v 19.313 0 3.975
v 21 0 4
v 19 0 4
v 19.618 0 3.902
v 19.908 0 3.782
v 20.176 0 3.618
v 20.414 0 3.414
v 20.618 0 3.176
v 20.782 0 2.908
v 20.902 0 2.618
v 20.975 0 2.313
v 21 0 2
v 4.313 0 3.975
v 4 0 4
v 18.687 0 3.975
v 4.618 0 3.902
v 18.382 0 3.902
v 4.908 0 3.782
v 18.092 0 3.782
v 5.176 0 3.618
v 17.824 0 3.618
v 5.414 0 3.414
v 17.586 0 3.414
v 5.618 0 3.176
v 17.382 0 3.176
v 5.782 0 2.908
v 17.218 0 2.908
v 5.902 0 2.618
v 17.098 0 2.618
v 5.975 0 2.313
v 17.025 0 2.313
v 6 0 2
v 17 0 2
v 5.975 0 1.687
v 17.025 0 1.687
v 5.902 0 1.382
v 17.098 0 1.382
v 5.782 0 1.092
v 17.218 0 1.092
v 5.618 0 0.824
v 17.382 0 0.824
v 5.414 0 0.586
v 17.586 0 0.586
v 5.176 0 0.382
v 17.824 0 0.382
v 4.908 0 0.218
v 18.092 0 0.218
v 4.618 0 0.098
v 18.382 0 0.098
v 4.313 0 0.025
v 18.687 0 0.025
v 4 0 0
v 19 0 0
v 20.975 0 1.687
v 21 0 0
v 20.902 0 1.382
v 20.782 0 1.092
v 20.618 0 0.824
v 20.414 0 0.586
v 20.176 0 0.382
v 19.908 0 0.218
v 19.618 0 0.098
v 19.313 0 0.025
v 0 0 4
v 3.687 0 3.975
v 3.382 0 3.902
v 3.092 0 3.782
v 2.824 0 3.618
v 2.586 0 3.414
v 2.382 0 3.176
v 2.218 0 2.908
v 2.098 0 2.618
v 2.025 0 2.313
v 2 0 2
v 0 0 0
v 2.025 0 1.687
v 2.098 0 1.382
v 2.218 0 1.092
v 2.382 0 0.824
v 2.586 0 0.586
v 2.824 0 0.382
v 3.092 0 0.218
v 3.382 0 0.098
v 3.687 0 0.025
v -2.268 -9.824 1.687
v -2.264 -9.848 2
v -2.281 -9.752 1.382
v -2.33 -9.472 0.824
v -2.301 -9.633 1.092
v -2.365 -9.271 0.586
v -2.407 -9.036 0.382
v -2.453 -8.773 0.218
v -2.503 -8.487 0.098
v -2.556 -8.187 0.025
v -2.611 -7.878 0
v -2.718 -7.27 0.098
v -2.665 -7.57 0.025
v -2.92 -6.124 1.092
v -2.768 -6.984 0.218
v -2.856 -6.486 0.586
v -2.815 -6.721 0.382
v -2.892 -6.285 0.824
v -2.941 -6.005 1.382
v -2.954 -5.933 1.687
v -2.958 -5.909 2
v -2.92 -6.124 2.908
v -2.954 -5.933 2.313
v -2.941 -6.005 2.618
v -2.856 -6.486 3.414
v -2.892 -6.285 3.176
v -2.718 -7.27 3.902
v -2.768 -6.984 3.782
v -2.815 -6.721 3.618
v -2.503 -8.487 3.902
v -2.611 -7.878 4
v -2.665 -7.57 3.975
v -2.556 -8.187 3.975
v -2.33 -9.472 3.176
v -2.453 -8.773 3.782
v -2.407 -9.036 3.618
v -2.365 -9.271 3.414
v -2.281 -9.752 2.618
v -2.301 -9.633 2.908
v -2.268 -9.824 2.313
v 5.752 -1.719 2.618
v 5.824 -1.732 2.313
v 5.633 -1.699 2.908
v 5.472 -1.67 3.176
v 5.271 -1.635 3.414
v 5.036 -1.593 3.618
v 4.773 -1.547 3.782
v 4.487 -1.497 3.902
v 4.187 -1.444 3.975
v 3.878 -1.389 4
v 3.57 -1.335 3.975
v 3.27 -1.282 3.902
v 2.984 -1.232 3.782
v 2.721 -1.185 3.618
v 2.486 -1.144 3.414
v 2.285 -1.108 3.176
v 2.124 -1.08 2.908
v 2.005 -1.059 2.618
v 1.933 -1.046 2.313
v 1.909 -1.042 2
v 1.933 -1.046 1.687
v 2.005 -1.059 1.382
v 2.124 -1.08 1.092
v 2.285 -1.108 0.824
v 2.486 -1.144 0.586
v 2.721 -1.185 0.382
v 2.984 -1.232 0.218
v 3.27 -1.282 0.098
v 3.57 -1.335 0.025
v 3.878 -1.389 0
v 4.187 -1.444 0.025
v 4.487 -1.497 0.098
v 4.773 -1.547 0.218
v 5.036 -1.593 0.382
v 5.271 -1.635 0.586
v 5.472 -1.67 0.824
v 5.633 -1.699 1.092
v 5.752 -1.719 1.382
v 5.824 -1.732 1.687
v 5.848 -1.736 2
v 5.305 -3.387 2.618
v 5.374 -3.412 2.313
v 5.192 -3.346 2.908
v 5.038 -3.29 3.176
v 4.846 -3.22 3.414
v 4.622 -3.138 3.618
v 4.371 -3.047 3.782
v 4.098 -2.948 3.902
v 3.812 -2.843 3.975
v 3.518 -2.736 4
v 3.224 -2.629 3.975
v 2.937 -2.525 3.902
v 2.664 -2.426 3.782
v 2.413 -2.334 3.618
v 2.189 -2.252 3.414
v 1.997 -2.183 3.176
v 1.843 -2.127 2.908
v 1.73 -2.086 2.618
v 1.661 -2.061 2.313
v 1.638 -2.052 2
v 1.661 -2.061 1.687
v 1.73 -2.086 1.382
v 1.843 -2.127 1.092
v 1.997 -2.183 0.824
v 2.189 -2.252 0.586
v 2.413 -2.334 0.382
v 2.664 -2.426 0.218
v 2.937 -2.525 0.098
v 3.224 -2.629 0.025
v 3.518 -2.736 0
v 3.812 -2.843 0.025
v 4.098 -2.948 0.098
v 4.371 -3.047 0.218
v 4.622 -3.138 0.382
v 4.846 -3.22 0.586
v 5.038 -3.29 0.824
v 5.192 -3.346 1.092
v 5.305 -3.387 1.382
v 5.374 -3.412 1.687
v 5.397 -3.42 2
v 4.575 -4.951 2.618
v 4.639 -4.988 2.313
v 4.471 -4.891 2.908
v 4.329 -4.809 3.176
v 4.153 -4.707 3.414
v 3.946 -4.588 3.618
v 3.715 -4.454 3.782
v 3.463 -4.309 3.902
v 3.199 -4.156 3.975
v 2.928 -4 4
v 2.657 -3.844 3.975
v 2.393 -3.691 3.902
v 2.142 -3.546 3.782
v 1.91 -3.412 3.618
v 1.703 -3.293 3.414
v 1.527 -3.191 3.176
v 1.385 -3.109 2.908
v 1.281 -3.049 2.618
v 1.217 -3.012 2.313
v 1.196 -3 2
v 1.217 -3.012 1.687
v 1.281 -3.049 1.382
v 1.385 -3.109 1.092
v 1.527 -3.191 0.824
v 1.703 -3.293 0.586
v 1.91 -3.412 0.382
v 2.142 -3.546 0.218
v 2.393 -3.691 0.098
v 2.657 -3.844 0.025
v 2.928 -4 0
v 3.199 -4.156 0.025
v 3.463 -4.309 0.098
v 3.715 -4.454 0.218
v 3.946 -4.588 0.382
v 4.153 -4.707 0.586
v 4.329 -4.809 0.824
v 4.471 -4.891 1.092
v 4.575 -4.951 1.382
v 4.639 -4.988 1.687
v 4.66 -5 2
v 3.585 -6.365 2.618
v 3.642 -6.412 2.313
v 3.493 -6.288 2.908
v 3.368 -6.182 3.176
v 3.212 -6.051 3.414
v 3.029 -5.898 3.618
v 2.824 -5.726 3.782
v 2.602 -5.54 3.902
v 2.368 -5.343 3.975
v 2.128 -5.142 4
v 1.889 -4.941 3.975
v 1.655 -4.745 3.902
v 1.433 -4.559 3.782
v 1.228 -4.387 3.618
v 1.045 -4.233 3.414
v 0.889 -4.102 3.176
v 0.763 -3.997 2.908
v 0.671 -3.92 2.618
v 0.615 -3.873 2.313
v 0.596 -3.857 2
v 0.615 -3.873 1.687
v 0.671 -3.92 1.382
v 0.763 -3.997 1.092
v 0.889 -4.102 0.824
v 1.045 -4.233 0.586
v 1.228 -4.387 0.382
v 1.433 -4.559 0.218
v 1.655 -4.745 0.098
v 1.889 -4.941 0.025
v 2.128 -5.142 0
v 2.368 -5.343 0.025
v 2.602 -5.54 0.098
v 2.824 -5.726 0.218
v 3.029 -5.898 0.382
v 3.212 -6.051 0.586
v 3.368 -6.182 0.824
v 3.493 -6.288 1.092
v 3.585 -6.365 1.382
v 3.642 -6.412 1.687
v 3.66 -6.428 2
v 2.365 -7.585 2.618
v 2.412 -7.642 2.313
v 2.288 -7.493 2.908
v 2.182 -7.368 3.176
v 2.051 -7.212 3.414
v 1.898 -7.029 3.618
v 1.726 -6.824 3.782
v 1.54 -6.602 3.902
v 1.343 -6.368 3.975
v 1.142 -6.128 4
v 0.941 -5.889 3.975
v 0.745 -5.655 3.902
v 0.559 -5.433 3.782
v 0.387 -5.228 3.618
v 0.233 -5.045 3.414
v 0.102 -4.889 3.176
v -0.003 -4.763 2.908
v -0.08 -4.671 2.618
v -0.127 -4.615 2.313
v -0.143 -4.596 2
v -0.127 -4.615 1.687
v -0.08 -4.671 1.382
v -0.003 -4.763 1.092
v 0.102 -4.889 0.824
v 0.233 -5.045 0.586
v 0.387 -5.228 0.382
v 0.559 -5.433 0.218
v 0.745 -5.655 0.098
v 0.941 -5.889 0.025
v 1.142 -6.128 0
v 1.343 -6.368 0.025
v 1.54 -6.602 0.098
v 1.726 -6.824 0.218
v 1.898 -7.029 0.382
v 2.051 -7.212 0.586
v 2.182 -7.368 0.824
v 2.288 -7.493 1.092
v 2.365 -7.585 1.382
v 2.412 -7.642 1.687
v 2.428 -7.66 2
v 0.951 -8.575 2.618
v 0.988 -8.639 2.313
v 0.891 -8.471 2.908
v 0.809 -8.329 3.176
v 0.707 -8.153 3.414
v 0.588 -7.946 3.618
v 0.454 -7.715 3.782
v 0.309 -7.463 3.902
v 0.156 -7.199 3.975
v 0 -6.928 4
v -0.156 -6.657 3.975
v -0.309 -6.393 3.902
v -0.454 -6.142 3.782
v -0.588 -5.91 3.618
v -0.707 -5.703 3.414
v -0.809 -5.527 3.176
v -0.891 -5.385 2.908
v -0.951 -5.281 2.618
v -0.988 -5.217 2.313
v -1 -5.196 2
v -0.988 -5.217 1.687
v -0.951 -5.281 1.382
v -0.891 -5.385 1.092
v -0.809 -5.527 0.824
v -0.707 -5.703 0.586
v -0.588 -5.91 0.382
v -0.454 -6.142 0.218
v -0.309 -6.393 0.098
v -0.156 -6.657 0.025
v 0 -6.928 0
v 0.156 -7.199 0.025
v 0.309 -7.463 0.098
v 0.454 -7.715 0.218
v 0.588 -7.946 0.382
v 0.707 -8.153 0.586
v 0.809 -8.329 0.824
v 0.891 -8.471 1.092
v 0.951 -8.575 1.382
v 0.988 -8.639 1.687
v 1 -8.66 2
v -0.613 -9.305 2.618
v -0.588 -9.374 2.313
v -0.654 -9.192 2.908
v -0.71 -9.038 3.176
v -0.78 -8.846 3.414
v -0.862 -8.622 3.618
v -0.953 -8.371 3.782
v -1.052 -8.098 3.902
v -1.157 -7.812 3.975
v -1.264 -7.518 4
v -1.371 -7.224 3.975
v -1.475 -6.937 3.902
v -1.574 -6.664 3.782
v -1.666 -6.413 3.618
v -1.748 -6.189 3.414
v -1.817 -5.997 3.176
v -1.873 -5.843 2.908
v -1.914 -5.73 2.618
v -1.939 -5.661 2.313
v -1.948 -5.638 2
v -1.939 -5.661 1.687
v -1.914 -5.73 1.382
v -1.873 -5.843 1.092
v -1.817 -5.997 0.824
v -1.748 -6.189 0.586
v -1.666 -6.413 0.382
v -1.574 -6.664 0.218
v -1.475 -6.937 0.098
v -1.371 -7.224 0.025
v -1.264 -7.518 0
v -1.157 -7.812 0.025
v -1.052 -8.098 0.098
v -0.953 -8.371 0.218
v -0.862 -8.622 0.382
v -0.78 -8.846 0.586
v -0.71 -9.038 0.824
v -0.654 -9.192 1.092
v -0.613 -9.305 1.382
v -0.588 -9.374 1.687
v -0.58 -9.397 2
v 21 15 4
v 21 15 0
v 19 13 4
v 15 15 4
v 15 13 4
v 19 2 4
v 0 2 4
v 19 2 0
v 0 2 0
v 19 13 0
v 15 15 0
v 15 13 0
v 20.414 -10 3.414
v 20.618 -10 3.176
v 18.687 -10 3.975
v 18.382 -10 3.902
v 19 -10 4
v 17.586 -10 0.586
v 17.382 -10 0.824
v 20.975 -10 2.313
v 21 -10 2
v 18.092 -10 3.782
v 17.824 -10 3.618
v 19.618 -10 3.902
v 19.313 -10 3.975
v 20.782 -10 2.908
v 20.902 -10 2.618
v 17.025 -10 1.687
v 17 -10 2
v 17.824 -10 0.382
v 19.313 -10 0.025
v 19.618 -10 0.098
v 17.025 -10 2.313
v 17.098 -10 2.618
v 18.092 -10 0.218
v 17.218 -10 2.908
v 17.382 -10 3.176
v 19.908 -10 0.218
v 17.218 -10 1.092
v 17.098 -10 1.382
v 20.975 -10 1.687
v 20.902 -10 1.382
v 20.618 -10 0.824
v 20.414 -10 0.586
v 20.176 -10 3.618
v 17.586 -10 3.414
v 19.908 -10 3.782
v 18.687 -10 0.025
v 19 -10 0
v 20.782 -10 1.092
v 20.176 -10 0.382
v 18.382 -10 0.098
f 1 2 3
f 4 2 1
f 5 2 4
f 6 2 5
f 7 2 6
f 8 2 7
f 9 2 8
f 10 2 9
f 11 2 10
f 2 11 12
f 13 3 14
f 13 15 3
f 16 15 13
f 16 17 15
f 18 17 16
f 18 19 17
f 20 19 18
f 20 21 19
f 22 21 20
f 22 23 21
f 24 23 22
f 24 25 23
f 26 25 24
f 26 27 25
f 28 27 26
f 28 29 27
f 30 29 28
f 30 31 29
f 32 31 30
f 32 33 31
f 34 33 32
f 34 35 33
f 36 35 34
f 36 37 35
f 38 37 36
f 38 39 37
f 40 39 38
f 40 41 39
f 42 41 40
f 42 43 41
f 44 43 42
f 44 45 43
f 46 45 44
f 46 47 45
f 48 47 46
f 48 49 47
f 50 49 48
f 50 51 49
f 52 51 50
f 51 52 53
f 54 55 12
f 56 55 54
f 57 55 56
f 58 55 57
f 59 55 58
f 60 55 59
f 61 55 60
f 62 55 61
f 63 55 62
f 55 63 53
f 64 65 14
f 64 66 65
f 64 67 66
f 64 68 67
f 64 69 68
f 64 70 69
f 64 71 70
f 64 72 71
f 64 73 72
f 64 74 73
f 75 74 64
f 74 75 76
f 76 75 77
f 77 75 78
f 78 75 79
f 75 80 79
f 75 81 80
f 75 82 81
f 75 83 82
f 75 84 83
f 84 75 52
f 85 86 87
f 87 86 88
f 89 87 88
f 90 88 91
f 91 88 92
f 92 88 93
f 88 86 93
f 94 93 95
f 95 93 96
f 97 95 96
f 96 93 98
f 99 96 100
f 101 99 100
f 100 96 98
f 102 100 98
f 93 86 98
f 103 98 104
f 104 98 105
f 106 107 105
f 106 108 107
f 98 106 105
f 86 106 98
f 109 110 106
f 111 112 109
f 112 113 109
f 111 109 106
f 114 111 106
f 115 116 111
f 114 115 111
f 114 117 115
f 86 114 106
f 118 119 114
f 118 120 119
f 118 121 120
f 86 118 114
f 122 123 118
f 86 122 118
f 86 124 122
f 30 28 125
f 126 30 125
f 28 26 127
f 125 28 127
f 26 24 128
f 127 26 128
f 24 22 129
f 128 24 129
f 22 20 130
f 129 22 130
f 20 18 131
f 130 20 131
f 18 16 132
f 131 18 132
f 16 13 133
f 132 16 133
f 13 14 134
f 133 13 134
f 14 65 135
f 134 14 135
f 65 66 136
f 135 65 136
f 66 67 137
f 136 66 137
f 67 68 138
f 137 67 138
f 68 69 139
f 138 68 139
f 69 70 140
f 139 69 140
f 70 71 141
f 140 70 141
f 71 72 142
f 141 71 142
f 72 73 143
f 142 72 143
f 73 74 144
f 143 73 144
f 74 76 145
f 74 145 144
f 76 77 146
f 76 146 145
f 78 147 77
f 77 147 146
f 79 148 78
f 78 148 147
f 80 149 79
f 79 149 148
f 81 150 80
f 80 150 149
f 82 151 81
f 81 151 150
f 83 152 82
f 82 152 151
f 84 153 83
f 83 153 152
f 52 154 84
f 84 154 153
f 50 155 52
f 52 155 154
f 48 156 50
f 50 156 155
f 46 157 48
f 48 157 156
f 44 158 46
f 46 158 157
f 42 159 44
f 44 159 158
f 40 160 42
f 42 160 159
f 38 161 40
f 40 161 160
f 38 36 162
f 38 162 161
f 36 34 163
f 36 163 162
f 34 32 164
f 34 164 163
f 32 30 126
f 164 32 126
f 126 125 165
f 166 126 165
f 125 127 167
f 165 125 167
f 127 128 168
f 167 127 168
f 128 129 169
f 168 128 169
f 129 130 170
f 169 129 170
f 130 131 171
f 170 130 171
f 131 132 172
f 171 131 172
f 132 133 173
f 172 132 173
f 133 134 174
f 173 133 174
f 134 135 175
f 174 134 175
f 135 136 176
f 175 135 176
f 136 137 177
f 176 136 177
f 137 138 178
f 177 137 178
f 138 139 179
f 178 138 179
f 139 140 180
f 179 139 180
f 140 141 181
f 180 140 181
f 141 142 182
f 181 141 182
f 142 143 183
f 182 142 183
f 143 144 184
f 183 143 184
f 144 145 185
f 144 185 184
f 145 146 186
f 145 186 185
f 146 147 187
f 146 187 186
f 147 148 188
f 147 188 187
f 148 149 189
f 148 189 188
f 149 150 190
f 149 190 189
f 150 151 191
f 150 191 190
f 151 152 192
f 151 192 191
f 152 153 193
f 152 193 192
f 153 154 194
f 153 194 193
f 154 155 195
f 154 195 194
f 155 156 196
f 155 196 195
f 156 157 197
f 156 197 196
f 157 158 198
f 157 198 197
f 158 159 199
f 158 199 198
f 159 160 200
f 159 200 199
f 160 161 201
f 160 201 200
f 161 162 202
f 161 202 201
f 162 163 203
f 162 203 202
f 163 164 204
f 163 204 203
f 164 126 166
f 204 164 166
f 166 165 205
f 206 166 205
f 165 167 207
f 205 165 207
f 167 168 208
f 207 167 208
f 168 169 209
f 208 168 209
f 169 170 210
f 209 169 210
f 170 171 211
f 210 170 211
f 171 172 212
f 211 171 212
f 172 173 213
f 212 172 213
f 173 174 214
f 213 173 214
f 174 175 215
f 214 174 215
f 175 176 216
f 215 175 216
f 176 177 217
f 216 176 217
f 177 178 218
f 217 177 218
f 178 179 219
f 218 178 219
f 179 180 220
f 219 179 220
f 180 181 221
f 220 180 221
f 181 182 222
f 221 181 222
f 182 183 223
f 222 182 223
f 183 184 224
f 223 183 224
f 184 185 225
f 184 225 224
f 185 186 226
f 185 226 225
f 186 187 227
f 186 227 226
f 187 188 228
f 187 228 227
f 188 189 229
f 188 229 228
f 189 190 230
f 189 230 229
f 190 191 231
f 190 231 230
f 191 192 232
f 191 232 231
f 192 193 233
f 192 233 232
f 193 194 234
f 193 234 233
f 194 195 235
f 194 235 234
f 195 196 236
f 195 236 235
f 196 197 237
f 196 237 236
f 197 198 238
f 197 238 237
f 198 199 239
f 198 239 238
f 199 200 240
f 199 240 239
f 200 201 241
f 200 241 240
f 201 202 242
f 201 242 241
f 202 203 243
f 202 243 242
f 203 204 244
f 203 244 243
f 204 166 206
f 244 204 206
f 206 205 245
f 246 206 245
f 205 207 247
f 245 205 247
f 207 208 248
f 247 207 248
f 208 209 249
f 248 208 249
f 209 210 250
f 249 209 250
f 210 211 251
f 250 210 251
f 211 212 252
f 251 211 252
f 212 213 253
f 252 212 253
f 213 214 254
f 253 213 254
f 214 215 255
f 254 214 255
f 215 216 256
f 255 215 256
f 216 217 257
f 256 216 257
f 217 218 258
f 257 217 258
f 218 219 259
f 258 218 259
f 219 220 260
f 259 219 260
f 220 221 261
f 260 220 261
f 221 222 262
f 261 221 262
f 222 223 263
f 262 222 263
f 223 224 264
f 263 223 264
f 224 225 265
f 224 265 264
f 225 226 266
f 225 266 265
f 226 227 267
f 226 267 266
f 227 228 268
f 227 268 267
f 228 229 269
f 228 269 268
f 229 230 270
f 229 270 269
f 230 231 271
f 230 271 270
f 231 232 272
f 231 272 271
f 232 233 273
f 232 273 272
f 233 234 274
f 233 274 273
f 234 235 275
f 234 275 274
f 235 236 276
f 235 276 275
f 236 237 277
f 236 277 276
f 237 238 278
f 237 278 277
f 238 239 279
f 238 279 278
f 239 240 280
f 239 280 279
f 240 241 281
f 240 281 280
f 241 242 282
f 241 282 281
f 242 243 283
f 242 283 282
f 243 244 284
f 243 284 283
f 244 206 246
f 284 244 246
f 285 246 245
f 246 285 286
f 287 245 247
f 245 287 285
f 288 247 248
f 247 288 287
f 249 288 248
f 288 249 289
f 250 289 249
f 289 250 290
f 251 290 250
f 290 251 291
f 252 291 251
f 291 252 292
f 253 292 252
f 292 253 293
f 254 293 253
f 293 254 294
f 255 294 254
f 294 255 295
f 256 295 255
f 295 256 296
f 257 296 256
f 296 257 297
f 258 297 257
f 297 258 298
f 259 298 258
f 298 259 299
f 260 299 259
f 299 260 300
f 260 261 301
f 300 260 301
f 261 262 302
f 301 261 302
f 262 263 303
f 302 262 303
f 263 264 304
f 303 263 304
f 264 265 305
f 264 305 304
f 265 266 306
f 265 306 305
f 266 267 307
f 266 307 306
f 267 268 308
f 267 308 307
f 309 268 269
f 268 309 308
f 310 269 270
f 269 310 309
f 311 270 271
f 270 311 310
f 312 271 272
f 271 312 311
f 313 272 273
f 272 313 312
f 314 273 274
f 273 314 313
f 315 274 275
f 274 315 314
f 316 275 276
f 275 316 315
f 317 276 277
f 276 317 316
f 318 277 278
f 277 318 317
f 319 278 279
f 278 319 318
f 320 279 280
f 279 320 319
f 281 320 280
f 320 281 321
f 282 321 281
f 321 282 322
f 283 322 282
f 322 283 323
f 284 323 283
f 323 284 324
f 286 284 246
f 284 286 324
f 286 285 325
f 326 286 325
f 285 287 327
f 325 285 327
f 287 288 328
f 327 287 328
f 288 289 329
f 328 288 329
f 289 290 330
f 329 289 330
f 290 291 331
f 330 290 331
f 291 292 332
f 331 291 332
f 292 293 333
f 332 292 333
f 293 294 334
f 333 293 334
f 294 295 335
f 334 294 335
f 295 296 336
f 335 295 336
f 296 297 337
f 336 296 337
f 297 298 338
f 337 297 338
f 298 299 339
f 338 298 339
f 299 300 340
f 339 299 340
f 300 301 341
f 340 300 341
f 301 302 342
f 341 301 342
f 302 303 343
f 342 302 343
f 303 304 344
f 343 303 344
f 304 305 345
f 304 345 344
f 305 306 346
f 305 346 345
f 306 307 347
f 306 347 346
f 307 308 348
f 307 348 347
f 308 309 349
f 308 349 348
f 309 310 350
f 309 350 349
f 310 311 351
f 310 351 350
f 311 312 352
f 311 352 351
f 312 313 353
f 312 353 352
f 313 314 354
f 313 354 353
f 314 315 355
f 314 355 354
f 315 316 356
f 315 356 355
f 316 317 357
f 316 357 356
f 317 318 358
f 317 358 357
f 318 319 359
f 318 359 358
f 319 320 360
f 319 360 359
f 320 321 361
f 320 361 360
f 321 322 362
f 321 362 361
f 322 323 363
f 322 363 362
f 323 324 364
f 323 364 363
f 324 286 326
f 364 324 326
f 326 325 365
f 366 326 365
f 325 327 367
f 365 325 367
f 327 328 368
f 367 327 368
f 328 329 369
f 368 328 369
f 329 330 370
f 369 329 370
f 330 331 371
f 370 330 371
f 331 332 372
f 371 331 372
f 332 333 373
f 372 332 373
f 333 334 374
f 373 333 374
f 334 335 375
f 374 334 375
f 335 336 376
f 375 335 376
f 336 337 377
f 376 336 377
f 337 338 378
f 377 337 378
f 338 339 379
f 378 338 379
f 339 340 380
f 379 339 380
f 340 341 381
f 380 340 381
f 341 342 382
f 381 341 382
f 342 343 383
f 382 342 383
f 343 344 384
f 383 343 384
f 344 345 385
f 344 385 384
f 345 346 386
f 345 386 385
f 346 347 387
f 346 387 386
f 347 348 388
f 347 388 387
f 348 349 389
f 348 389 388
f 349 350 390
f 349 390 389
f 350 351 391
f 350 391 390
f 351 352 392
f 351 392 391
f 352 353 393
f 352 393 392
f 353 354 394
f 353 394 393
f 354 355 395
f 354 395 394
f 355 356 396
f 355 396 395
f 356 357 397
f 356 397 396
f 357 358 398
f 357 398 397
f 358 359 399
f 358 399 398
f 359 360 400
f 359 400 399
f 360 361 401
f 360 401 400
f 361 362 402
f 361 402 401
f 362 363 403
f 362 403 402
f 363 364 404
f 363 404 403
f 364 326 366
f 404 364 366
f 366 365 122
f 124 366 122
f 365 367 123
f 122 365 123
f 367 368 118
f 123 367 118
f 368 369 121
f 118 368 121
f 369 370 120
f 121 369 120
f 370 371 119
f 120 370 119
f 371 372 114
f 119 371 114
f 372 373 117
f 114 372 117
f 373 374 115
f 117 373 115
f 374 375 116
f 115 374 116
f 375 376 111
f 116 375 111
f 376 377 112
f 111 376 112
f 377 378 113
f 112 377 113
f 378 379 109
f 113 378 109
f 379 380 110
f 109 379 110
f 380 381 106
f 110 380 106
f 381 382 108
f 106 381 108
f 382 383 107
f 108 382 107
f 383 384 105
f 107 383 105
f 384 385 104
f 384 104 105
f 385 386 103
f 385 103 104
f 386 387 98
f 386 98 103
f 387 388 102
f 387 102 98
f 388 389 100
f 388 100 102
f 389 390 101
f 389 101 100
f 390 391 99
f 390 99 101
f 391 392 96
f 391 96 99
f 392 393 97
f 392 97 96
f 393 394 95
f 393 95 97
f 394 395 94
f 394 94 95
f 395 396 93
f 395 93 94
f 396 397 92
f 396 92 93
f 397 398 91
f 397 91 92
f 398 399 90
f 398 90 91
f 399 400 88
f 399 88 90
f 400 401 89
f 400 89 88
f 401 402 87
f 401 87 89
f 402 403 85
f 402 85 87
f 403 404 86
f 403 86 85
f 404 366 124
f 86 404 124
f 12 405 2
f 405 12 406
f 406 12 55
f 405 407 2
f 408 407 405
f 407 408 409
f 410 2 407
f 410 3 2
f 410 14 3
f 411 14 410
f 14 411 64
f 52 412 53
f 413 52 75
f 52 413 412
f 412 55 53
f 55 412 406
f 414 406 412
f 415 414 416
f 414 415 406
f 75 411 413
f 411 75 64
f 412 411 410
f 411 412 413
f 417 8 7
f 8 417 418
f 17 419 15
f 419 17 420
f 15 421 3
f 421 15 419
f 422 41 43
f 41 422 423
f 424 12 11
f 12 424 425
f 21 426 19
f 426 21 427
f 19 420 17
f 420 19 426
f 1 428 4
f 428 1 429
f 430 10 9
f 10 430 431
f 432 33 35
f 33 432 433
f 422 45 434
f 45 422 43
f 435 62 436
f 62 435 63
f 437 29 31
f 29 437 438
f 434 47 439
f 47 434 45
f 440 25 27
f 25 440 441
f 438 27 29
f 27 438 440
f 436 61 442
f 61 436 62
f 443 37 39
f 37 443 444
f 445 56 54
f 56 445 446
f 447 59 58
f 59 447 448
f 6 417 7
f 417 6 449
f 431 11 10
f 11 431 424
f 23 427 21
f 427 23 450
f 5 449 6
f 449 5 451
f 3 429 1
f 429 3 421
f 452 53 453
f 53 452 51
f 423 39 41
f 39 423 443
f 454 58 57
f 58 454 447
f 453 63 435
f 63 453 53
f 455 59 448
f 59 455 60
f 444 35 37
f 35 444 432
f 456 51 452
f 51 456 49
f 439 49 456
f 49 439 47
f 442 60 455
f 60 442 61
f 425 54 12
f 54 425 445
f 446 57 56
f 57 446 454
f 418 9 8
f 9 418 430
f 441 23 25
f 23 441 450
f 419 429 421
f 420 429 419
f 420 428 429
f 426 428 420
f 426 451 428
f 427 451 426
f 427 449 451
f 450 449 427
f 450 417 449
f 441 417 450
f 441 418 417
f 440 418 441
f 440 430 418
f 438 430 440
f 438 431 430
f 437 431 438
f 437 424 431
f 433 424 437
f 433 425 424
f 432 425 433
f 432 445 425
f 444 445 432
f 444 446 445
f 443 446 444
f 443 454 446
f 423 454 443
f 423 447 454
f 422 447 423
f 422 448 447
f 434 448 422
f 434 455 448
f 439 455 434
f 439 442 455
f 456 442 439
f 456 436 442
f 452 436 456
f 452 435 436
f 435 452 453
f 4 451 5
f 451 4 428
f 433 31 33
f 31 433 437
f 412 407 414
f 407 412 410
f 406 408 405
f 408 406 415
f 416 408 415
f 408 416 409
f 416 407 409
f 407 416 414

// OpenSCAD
// preview[view:south east, tilt:top]

// degrees - This angles the point from straight out to straight up.
BendAngle = 90; //[0:90]

// millimeters - This defines the radius of the bend from the shank (the wall) to the point.
BendRadius = 10; //[0:100]

// millimeters - Not a true gape (gap), this is the distance from the shank (the wall) to the bend in the hook.
Gape = 10; //[0:100]

// millimeters - The throat (bite) is the measure in millimeters from the lowest point in the gape(gap)to the height of the point.
Throat = 10; //[0:100]

// Circle/Sphere resolution
$fn = 40;

// millimeters - The peg board thickness
pbt = 1;

// millimeters - The hole spacing
hs = 15;

// millimeters - The hole diameter
hd = 5 - 1;

// millimeters - The hole radius, half the diameter.
hr = hd/2;

distanceToWall = 12;

plateLength = hs+hd+hr;

module PegBoardAnchor() {
    plateThickness = 2;
    
    union() {
        // Upper pegboard anchor to wall
        translate([hd-min(distanceToWall,10-hr),0,hr])
            rotate([0,180,180])
                //difference() {
                    // torus
                    rotate_extrude(angle=80, convexity=10)
                        translate([min(distanceToWall,10-hr),0,0])
                        circle(hr, center=true);
                    
                    //translate([hr,0,0])
                    //    cube(hr);
                //}
        
        // The shank of the hook
        cube([plateLength,plateThickness,hd]);

        // Lower pegboard anchor to wall
        translate([hs+hd,0,hr])
            rotate([0,-90,90])
                cylinder(h=min(distanceToWall+pbt, 10), r=hr);

    }
}

module FrontHook() {
    cube([2,15,hd]);
    translate([-hd,15-2,0])
        cube([5,2,hd]);
}

module PegBoardHook(gape, throat, bendRadius, bendAngle, center=false) {
    pbaX = hs+pbt+hd+hr+hr/2;
    pbaY = pbt+hd+hr;
    
    partX = pbaX + max(pbaX,throat+hd+hr/2) - pbaX;
    partY = pbaY + gape + hd;
    
    offsetX = center ? (-partX/2 - (throat > pbaX ? pbaX-throat-hd-hr/2 : 0)) : 0;
    offsetY = center ? (-partY/2) : 0;
        
    //translate([offsetX,offsetY,0])
        union() {
            PegBoardAnchor();
            
            translate([plateLength-2,0,0])
                FrontHook();
        }
}


/*pegHoleDiameterInMillimeters = 5;
pegHoleRadius = (pegHoleDiameterInMillimeters - 1) / 2;
pegBoardDistanceToWallInMillimeters = 13;
hiddenHolderLength = pegBoardDistanceToWallInMillimeters / 2;


cylinder(h=hiddenHolderLength, radius=pegHoleRadius);
*/
//render()
    PegBoardHook(Gape, Throat, BendRadius, BendAngle, true);
